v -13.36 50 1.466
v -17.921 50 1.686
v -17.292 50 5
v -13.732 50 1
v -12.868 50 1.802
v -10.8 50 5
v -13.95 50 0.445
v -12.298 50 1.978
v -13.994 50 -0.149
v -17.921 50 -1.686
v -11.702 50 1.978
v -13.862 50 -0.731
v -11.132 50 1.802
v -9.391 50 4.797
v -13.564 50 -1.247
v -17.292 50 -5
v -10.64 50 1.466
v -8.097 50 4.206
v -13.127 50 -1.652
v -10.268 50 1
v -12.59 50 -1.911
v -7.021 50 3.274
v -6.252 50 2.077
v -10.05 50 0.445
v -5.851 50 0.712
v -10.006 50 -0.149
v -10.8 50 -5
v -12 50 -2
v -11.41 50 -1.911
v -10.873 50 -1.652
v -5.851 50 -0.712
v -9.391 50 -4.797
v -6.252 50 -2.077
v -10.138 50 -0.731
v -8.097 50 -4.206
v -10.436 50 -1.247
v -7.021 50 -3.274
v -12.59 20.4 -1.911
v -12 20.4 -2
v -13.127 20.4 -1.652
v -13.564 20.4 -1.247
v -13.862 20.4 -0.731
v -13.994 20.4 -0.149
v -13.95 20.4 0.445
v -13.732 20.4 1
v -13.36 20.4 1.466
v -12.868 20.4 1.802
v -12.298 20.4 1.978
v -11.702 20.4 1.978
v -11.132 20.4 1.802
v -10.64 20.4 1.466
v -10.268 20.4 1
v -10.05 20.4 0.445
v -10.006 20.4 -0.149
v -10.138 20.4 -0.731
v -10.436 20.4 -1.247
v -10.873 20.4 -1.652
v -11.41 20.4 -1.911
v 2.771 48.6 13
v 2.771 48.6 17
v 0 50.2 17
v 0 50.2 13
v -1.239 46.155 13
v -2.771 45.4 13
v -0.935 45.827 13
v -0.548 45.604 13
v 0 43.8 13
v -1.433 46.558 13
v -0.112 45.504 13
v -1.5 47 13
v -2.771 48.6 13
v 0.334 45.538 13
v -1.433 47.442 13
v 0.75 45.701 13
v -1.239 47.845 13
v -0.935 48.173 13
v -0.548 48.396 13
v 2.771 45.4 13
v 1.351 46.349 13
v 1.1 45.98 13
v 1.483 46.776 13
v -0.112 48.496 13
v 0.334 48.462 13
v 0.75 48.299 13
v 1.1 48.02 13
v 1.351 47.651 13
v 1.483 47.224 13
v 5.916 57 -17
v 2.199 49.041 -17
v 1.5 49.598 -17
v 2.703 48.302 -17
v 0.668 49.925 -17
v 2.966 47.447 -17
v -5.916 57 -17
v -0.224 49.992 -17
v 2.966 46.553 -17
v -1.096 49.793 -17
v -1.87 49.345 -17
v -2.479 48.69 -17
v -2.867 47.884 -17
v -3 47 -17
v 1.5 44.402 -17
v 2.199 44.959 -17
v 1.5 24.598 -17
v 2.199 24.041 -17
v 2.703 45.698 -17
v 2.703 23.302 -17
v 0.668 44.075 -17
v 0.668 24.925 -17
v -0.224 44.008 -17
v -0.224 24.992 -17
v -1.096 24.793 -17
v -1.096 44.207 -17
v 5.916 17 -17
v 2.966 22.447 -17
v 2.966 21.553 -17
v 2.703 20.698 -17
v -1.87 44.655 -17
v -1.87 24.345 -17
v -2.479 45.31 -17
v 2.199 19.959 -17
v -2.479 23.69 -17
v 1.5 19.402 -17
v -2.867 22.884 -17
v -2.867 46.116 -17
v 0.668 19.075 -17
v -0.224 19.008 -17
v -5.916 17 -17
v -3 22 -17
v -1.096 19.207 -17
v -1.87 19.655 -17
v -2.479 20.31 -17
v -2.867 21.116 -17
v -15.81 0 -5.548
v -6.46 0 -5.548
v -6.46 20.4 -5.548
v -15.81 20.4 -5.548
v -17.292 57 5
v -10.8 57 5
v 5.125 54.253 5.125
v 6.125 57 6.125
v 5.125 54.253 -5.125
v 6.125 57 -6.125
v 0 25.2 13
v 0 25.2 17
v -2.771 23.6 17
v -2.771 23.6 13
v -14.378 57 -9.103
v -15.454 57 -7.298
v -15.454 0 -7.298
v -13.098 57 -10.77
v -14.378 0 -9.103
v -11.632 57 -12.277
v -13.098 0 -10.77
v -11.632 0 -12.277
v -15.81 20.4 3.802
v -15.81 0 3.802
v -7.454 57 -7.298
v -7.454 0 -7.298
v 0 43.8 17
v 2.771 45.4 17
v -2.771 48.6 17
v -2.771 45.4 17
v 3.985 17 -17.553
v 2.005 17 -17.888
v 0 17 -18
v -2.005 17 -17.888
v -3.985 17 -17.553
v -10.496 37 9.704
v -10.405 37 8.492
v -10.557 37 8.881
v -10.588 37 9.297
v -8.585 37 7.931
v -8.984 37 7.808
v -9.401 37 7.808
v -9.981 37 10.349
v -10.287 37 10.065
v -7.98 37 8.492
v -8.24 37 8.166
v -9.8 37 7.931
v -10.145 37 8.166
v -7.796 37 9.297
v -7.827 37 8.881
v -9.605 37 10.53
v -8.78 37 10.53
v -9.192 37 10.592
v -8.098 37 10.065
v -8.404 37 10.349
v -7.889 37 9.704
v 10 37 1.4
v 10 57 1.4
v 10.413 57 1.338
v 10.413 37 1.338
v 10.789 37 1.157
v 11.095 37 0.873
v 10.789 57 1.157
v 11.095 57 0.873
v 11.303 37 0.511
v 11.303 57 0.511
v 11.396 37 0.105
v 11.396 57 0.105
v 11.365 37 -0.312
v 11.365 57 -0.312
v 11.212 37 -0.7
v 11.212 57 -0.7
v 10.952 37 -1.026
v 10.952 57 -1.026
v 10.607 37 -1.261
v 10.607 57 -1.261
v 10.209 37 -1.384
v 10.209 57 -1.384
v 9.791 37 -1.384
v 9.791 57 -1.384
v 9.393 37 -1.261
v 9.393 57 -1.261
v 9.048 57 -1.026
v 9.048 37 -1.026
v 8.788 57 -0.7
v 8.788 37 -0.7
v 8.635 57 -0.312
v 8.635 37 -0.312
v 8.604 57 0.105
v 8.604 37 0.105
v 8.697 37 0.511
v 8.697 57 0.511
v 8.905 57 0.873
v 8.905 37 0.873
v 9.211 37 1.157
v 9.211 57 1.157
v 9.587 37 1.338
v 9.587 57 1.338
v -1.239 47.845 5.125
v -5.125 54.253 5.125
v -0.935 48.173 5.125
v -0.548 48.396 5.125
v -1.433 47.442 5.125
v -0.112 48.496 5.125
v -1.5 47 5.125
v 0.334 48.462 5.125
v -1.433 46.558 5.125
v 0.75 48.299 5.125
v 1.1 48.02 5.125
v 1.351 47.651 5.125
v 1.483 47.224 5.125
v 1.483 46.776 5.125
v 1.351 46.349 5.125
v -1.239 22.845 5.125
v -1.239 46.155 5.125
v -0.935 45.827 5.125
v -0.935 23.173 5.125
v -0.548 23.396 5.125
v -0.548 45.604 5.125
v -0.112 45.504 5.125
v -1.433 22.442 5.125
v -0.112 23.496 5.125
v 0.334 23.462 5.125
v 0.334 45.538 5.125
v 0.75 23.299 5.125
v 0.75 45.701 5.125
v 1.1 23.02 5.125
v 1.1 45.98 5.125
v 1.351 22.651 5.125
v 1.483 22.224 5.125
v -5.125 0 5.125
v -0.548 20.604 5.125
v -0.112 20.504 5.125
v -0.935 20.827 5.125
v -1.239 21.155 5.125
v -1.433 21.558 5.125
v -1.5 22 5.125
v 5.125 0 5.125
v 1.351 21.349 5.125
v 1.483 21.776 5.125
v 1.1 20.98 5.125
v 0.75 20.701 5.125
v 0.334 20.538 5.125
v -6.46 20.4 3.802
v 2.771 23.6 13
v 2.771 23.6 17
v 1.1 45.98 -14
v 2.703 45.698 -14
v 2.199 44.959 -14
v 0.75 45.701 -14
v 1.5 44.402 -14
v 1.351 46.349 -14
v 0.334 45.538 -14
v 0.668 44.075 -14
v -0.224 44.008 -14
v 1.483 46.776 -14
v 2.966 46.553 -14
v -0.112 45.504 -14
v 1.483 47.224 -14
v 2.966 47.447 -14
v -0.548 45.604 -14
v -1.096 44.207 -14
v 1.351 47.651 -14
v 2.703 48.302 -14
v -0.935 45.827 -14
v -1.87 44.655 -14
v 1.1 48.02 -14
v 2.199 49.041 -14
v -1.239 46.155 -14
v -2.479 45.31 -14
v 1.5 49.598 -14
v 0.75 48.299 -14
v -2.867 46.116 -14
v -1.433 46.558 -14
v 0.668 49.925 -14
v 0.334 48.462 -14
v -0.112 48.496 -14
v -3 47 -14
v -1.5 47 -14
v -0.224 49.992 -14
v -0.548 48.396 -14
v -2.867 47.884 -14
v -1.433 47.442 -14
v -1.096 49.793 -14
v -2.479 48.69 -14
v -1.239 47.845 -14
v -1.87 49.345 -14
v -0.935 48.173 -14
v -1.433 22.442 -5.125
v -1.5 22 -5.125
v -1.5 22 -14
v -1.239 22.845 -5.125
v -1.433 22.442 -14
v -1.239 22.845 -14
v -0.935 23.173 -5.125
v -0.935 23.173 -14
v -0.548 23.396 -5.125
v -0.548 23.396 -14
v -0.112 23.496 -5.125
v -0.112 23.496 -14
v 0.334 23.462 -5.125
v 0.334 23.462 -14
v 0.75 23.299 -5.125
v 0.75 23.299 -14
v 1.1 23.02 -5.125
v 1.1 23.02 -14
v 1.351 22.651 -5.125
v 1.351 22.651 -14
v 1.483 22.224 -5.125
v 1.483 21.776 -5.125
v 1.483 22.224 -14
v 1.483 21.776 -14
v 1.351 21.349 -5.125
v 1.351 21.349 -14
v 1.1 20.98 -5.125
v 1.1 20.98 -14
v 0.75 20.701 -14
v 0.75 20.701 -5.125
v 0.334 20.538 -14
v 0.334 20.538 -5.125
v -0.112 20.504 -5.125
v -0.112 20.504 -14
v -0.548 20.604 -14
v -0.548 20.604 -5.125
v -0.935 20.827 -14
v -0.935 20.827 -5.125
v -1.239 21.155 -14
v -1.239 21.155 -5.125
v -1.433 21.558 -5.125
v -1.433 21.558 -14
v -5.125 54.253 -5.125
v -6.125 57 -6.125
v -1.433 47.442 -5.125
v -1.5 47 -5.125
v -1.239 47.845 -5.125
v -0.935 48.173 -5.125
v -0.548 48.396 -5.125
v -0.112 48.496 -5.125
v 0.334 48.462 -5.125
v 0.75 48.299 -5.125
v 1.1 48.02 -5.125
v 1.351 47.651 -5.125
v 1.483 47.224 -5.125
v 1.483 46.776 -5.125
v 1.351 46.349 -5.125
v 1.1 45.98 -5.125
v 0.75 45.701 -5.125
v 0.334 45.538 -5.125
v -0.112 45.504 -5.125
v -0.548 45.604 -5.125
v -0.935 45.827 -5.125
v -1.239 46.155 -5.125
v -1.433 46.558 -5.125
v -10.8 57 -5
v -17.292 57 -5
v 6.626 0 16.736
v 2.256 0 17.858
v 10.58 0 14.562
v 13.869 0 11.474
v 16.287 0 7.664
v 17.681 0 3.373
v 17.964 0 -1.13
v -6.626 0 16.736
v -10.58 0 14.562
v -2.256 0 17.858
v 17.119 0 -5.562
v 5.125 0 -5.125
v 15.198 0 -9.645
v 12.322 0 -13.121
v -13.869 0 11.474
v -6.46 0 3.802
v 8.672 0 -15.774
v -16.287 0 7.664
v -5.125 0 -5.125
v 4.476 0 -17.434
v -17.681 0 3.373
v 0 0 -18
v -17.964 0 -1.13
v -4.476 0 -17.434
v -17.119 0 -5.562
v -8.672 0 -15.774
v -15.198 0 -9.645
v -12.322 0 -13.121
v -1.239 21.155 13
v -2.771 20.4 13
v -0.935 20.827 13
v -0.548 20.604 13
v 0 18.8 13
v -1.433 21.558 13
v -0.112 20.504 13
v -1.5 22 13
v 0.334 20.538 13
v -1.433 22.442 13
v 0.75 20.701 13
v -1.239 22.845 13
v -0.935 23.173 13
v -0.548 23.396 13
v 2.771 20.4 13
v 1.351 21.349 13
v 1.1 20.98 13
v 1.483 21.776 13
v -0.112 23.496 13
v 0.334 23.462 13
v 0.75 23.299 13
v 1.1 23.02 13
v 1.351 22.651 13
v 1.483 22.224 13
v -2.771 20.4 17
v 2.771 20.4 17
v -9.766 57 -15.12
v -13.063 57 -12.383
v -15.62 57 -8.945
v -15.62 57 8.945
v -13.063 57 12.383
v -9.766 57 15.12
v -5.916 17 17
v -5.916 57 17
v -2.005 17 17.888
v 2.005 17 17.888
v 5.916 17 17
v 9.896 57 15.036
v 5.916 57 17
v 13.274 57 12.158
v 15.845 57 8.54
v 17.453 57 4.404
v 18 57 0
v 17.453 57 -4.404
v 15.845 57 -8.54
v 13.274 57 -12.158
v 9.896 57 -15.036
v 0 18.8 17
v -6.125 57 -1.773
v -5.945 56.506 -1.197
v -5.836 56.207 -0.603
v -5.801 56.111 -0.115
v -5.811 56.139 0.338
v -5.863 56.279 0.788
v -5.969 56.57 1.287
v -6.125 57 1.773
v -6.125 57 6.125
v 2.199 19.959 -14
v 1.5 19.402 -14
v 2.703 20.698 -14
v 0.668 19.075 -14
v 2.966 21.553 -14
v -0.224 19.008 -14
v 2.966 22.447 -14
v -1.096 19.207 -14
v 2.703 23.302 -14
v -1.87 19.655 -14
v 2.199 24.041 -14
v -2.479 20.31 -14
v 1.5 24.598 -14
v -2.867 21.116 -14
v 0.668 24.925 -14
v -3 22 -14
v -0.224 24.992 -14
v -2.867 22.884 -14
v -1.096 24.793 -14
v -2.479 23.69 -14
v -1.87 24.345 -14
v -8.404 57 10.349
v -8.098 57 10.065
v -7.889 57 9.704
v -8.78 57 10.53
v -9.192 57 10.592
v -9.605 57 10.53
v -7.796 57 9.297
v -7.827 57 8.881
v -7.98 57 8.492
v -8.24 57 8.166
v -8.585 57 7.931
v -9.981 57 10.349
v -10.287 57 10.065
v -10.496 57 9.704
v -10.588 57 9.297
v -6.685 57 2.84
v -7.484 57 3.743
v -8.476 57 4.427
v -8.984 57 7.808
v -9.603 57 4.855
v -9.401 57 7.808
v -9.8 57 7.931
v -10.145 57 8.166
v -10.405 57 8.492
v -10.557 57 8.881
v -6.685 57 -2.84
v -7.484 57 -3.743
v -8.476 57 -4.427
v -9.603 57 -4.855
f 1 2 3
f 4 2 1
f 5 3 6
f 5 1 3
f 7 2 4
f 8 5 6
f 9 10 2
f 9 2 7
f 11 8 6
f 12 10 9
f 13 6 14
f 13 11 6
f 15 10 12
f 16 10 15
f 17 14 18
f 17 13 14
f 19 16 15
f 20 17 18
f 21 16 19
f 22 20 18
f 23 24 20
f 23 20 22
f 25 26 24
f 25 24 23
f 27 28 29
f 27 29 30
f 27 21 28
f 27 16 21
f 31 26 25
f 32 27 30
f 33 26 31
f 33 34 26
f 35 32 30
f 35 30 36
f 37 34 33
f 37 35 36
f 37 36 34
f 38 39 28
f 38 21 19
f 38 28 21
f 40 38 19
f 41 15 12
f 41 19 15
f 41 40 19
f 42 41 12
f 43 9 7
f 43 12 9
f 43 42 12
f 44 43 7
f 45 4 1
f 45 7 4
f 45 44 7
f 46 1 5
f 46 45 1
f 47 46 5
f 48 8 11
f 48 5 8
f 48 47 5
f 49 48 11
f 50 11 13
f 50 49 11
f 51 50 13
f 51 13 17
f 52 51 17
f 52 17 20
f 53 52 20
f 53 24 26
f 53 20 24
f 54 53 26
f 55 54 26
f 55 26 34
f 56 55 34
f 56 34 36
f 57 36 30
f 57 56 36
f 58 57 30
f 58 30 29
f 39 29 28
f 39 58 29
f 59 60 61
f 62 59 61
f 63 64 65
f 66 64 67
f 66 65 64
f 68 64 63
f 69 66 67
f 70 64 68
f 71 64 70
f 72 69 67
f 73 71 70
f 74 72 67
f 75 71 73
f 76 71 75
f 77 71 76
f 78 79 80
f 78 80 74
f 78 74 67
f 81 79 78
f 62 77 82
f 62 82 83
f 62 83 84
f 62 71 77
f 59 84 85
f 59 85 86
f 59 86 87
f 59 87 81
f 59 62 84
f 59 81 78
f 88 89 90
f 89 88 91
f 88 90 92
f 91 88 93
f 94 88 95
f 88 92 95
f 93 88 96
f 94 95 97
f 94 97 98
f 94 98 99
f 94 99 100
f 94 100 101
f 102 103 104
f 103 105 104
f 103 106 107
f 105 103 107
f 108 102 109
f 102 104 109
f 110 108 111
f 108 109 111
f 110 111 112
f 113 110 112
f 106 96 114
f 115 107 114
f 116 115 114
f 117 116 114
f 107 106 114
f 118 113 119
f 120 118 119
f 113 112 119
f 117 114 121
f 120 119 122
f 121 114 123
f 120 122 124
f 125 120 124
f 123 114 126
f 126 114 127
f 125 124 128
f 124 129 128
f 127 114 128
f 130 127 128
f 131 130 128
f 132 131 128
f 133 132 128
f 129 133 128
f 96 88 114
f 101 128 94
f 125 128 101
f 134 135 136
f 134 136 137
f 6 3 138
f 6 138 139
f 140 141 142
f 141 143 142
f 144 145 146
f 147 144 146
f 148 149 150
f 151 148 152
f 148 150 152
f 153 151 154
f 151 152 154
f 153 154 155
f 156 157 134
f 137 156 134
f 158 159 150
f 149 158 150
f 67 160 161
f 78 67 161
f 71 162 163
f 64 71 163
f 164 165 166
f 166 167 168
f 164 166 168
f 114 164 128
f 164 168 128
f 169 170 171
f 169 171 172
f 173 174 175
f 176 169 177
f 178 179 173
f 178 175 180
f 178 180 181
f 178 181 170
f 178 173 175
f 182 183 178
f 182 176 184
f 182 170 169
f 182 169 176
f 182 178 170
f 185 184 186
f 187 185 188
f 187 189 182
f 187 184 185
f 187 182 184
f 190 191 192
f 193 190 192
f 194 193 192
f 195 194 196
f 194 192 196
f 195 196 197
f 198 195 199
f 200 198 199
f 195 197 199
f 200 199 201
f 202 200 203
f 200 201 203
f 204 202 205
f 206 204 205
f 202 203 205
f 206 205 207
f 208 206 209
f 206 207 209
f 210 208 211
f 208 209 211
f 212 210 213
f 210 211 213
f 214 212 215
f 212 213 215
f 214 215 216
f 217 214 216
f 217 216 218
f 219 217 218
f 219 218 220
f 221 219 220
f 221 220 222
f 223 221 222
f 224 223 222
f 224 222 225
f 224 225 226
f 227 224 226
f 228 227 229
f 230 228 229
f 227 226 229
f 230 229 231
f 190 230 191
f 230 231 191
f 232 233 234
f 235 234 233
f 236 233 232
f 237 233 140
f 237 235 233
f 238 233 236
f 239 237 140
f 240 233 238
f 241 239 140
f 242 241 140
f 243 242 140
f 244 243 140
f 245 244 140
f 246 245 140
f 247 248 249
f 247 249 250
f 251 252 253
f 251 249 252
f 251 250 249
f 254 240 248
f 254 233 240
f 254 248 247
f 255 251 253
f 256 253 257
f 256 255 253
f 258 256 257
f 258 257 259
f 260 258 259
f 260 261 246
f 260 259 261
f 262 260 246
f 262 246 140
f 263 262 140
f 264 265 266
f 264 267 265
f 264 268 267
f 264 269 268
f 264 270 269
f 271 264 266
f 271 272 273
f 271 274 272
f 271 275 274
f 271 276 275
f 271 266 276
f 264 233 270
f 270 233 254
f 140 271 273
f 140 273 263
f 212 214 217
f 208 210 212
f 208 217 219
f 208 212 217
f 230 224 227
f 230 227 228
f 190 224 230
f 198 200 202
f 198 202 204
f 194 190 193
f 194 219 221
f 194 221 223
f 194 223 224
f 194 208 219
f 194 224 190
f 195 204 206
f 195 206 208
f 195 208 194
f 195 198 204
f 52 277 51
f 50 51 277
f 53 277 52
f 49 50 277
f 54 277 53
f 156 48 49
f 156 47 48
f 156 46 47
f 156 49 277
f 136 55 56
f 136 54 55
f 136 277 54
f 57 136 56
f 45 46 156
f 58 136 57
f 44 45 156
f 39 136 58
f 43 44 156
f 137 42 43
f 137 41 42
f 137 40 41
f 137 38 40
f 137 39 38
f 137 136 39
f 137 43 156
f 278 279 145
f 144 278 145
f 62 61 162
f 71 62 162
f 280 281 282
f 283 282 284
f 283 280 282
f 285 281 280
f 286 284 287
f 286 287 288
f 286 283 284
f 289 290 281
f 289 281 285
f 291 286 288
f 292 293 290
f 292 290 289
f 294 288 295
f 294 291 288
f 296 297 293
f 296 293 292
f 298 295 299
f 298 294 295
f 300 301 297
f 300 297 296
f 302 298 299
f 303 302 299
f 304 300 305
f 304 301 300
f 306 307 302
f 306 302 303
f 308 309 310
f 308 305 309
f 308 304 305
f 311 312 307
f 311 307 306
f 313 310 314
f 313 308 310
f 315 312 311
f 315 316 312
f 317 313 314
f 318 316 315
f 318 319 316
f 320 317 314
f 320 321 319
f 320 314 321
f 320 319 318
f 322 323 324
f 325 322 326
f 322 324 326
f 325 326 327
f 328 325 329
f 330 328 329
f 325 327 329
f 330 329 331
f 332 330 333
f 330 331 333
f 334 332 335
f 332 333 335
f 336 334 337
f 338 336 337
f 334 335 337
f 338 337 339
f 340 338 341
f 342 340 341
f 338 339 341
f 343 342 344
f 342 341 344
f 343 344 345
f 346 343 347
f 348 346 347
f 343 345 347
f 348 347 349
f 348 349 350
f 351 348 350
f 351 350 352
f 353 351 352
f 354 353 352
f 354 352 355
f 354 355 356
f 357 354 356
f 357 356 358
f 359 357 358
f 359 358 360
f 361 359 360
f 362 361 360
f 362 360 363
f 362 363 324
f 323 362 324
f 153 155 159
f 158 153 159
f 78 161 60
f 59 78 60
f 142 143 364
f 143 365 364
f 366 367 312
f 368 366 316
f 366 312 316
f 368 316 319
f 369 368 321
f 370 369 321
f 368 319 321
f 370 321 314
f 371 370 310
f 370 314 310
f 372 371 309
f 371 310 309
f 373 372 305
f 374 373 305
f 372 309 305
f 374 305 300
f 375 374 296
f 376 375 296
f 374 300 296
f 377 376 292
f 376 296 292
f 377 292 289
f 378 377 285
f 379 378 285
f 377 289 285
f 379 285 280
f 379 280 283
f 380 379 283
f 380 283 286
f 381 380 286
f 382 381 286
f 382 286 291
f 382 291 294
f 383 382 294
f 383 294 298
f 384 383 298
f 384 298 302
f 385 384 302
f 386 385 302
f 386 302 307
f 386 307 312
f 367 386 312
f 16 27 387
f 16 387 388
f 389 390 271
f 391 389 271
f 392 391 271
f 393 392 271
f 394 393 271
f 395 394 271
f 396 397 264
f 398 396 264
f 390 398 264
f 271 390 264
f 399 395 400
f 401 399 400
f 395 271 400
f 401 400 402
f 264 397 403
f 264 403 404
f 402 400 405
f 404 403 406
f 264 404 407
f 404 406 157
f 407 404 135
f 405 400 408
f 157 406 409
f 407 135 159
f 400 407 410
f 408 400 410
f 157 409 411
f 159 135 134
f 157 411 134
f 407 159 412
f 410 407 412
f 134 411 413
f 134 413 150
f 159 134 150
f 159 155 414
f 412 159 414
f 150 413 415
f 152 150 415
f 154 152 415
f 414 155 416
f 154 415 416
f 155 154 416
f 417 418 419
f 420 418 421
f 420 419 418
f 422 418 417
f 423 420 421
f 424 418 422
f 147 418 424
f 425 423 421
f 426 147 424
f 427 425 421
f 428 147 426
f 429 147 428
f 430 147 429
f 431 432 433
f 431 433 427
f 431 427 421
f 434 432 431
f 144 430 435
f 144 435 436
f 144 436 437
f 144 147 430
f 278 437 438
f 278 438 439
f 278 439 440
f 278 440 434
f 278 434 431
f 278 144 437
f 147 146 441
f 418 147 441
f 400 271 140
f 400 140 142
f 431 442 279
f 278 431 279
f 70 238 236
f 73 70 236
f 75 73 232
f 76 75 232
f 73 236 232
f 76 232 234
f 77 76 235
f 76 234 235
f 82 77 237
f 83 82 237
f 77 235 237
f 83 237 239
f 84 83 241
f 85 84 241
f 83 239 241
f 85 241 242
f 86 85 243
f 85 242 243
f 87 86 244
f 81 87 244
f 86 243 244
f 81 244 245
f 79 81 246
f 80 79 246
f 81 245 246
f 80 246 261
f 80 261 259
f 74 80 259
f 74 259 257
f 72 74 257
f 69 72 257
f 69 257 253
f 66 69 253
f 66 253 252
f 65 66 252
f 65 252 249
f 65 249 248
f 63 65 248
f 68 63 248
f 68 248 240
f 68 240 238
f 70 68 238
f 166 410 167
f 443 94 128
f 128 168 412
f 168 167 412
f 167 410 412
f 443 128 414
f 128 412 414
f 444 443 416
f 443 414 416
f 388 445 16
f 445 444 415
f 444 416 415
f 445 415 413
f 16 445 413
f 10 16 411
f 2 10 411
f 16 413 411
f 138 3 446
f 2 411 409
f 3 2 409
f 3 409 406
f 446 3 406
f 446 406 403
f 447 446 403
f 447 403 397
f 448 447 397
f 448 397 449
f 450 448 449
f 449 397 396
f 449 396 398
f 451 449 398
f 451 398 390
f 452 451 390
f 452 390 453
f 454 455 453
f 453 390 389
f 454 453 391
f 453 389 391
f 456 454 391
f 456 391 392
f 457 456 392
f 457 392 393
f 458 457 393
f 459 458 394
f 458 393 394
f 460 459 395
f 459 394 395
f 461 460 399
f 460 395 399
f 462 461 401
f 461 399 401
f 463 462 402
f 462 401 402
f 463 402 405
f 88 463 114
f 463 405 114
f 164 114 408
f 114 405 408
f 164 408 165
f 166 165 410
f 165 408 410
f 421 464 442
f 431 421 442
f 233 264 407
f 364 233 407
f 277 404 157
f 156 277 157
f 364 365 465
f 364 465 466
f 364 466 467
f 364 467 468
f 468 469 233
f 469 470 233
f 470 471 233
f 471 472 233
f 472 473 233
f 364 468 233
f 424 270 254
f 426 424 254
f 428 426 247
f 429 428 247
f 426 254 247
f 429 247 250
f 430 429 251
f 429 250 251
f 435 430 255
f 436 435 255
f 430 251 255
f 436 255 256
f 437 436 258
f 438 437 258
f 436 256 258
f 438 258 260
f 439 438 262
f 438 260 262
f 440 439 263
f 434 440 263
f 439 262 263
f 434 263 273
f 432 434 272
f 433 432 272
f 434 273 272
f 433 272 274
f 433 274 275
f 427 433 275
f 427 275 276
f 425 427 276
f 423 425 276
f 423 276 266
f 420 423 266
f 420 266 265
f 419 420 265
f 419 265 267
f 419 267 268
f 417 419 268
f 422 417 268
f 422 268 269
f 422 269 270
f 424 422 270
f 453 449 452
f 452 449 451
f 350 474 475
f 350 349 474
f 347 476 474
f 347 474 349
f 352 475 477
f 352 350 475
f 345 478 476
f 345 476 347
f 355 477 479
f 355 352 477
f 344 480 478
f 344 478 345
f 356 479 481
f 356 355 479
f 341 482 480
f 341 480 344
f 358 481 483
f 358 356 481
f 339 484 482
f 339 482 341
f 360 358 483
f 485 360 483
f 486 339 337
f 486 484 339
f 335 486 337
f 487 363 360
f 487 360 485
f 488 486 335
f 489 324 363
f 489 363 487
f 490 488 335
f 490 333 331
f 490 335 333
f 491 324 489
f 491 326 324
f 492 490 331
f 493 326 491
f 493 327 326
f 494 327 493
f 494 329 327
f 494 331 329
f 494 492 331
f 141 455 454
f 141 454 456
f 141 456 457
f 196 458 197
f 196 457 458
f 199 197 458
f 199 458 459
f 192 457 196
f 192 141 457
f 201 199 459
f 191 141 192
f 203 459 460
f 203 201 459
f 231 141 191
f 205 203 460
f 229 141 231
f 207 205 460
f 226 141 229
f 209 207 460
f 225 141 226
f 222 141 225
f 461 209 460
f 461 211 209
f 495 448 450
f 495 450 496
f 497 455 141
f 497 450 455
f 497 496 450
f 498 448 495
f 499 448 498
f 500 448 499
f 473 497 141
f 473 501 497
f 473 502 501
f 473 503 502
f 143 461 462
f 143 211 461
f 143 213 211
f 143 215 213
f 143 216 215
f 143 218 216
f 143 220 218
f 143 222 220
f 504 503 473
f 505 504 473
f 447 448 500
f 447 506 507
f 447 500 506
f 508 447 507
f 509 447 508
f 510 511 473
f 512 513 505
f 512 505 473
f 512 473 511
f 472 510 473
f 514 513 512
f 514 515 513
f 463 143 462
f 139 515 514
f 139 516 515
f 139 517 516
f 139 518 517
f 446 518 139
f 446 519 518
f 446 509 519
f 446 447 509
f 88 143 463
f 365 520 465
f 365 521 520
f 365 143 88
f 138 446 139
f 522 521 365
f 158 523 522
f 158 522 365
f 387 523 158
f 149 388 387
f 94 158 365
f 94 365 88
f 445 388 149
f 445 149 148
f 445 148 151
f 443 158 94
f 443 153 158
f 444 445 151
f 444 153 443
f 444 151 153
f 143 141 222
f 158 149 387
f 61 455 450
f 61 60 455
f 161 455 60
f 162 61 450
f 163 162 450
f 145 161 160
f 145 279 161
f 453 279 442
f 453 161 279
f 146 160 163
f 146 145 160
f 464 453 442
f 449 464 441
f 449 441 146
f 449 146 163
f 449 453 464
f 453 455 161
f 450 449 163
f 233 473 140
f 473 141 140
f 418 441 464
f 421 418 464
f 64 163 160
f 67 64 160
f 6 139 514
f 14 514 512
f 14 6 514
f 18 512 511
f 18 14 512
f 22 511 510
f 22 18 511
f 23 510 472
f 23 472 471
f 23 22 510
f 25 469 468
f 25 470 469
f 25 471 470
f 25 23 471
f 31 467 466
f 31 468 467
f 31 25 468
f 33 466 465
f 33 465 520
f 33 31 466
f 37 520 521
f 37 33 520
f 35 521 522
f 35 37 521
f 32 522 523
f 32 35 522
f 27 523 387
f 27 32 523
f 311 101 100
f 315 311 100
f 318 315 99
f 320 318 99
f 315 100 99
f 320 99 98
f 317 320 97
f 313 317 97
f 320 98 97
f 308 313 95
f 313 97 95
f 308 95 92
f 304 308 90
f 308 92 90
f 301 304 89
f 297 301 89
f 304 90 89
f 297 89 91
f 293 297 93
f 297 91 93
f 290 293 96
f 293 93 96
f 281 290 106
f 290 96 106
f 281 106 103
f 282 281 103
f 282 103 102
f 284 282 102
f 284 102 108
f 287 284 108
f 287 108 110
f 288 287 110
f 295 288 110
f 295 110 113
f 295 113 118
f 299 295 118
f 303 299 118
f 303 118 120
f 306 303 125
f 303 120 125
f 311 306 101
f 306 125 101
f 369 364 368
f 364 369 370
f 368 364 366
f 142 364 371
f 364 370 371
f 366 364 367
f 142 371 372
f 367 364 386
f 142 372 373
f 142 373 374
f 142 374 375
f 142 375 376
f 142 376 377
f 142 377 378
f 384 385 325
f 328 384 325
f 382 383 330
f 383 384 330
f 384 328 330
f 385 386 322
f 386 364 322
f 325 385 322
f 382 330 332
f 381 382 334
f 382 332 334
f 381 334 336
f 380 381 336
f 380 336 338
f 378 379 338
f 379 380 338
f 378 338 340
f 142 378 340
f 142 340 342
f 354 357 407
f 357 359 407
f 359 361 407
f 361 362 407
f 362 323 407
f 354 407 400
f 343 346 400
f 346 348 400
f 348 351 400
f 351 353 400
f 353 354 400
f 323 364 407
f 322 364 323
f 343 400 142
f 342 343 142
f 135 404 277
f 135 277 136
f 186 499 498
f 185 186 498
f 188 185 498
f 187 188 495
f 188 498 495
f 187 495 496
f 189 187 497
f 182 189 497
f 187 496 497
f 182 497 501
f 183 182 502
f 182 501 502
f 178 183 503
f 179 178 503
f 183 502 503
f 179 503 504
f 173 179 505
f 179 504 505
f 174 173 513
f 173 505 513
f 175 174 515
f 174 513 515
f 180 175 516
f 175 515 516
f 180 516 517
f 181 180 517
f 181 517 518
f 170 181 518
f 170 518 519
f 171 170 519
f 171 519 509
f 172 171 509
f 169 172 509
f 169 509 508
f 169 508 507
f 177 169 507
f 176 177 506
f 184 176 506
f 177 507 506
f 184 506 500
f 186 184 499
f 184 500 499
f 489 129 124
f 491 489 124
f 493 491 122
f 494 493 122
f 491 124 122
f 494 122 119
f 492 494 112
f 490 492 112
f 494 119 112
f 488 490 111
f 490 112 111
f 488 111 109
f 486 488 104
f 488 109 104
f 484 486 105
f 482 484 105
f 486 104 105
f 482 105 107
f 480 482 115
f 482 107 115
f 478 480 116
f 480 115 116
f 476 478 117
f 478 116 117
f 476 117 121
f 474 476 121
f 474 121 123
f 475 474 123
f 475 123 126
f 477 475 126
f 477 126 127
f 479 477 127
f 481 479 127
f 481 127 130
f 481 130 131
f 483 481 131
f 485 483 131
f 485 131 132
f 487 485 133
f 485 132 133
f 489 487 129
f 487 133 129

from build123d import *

# Parameters (mm, degrees)
SKETCH1_R           = 18
SKETCH1_R_2         = 2
SKETCH1_W           = 10.25
SKETCH1_H           = 10.25
BOSS_EXTRUDE1_DEPTH = 57
CUT_EXTRUDE1_START  = -7
CUT_EXTRUDE1_DEPTH  = 7
SKETCH4_W           = 9.35
SKETCH4_H           = 9.35
CUT_EXTRUDE3_DEPTH  = 20.4
CUT_EXTRUDE4_START  = -40
CUT_EXTRUDE4_DEPTH  = 40
SKETCH6_R           = 1.5
CUT_EXTRUDE5_DEPTH  = 70.267597042
SKETCH7_R           = 3
CUT_EXTRUDE6_DEPTH  = 3
CUT_EXTRUDE7_DEPTH  = 4
CHAMFER1_SIZE       = 1
CHAMFER1_SIZE_2     = 2.747477419
CUT_EXTRUDE8_DEPTH  = 63.42595614
SKETCH12_R          = 1.4
CUT_EXTRUDE10_DEPTH = 20


with BuildPart() as part:
    # Sketch1 → Boss-Extrude1 (new body)
    with BuildSketch(Plane(origin=(0, 0, 0), x_dir=(1, 0, 0), z_dir=(0, 1, 0))):
        with Locations(Location((0, 0, 0), (0, 0, 90))):
            Circle(SKETCH1_R)
        with Locations(Location((-12, 0, 0), (0, 0, 90))):
            Circle(SKETCH1_R_2, mode=Mode.SUBTRACT)
        Rectangle(SKETCH1_W, SKETCH1_H, mode=Mode.SUBTRACT)
    extrude(amount=BOSS_EXTRUDE1_DEPTH)

    # Sketch2 → Cut-Extrude1 (cut)
    with BuildSketch(Plane(origin=(0, 57, 0), x_dir=(1, 0, 0), z_dir=(0, 1, 0)).offset(CUT_EXTRUDE1_START)):
        with BuildLine():
            Line((-10.8, 5), (-17.291616466, 5))
            ThreePointArc((-17.291616466, 5), (-18, 0), (-17.291616466, -5))
            Line((-17.291616466, -5), (-10.8, -5))
            ThreePointArc((-10.8, -5), (-5.8, 0), (-10.8, 5))
        make_face()
    extrude(amount=CUT_EXTRUDE1_DEPTH, mode=Mode.SUBTRACT)

    # Sketch4 → Cut-Extrude3 (cut)
    with BuildSketch(Plane(origin=(0, 0, 0), x_dir=(-1, 0, 0), z_dir=(0, -1, 0))):
        with Locations((11.135393506, 0.872889968)):
            Rectangle(SKETCH4_W, SKETCH4_H)
    extrude(amount=-CUT_EXTRUDE3_DEPTH, mode=Mode.SUBTRACT)

    # Sketch5 → Cut-Extrude4 (cut)
    with BuildSketch(Plane(origin=(0, 57, 0), x_dir=(1, 0, 0), z_dir=(0, 1, 0)).offset(CUT_EXTRUDE4_START)):
        with BuildLine():
            Line((5.916079783, 17), (-5.916079783, 17))
            ThreePointArc((-5.916079783, 17), (0, 18), (5.916079783, 17))
        make_face()
        with BuildLine():
            Line((5.916079783, -17), (-5.916079783, -17))
            ThreePointArc((-5.916079783, -17), (0, -18), (5.916079783, -17))
        make_face()
    extrude(amount=CUT_EXTRUDE4_DEPTH, mode=Mode.SUBTRACT)

    # Sketch6 → Cut-Extrude5 (cut, through all)
    with BuildSketch(Plane(origin=(0, 0, -17), x_dir=(-1, 0, 0), z_dir=(0, 0, -1))):
        with Locations((0, 47)):
            Circle(SKETCH6_R)
        with Locations((0, 22)):
            Circle(SKETCH6_R)
    extrude(amount=-CUT_EXTRUDE5_DEPTH, mode=Mode.SUBTRACT)

    # Sketch7 → Cut-Extrude6 (cut)
    with BuildSketch(Plane(origin=(0, 0, -17), x_dir=(-1, 0, 0), z_dir=(0, 0, -1))):
        with Locations((0, 47)):
            Circle(SKETCH7_R)
        with Locations((0, 22)):
            Circle(SKETCH7_R)
    extrude(amount=-CUT_EXTRUDE6_DEPTH, mode=Mode.SUBTRACT)

    # Sketch8 → Cut-Extrude7 (cut)
    with BuildSketch(Plane.XY.offset(17)):
        Polygon((0, 43.8), (2.771281292, 45.4), (2.771281292, 48.6), (0, 50.2), (-2.771281292, 48.6), (-2.771281292, 45.4), align=None)
        Polygon((0, 18.8), (2.771281292, 20.4), (2.771281292, 23.6), (0, 25.2), (-2.771281292, 23.6), (-2.771281292, 20.4), align=None)
    extrude(amount=-CUT_EXTRUDE7_DEPTH, mode=Mode.SUBTRACT)

    # Chamfer1
    # the kernel refuses this chamfer: 2.747477419, 1 mm, written as the material it takes off along each edge
    with BuildSketch(Plane(origin=(-5.125, 57, -5.125), x_dir=(0, 0.09904090225204956, -0.9950833631817488), z_dir=(1, 0, 0)), Plane(origin=(-5.125, 57, 5.125), x_dir=(-0.9950833631817488, 0.09904090225204956, 0), z_dir=(0, 0, -1)), Plane(origin=(5.125, 57, 5.125), x_dir=(0, 0.09904090225204956, 0.9950833631817488), z_dir=(-1, 0, 0)), Plane(origin=(5.125, 57, -5.125), x_dir=(0.9950833631817488, 0.09904090225204956, 0), z_dir=(0, 0, 1))) as chamfer1_piece_1:
        Polygon((CHAMFER1_SIZE * 0.995083363182, -CHAMFER1_SIZE * 0.099040902252), (-CHAMFER1_SIZE_2 * 0.0990409022684, -CHAMFER1_SIZE_2 * 0.995083363346), (0, 0), align=None)
    extrude(amount=10.25, mode=Mode.SUBTRACT)
    with BuildSketch(Plane(origin=(-5.125, 57, 5.125), x_dir=(-0.9950833631817488, 0.09904090225204956, 0), z_dir=(0, 0, -1))) as chamfer1_piece_2a_section:
        Polygon((CHAMFER1_SIZE * 0.995083363182, -CHAMFER1_SIZE * 0.099040902252), (-CHAMFER1_SIZE_2 * 0.0990409022684, -CHAMFER1_SIZE_2 * 0.995083363346), (0, 0), align=None)
    chamfer1_piece_2a = extrude(amount=17.377491449, mode=Mode.PRIVATE)
    chamfer1_piece_2a = split(chamfer1_piece_2a, bisect_by=Plane(origin=(-5.432505006, 56.059901151, -5.125), z_dir=(0, 0, -1)), keep=Keep.TOP, mode=Mode.PRIVATE)
    with BuildSketch(Plane(origin=(-12.252491449, 57, -5.125), x_dir=(0, 0.09904090225204956, -0.9950833631817488), z_dir=(1, 0, 0))) as chamfer1_piece_2b_section:
        Polygon((CHAMFER1_SIZE * 0.995083363182, -CHAMFER1_SIZE * 0.099040902252), (-CHAMFER1_SIZE_2 * 0.0990409022684, -CHAMFER1_SIZE_2 * 0.995083363346), (0, 0), align=None)
    chamfer1_piece_2b = extrude(amount=17.377491449, mode=Mode.PRIVATE)
    chamfer1_piece_2b = split(chamfer1_piece_2b, bisect_by=Plane(origin=(-5.125, 56.059901151, -5.432505006), z_dir=(-1, 0, 0)), keep=Keep.TOP, mode=Mode.PRIVATE)
    chamfer1_piece_2 = chamfer1_piece_2a & chamfer1_piece_2b
    add(chamfer1_piece_2, mode=Mode.SUBTRACT)
    with BuildSketch(Plane(origin=(5.125, 57, -12.252491449), x_dir=(0.9950833631817488, 0.09904090225204956, 0), z_dir=(0, 0, 1))) as chamfer1_piece_3a_section:
        Polygon((CHAMFER1_SIZE * 0.995083363182, -CHAMFER1_SIZE * 0.099040902252), (-CHAMFER1_SIZE_2 * 0.0990409022684, -CHAMFER1_SIZE_2 * 0.995083363346), (0, 0), align=None)
    chamfer1_piece_3a = extrude(amount=17.377491449, mode=Mode.PRIVATE)
    chamfer1_piece_3a = split(chamfer1_piece_3a, bisect_by=Plane(origin=(5.432505006, 56.059901151, -5.125), z_dir=(0, 0, -1)), keep=Keep.TOP, mode=Mode.PRIVATE)
    with BuildSketch(Plane(origin=(-5.125, 57, -5.125), x_dir=(0, 0.09904090225204956, -0.9950833631817488), z_dir=(1, 0, 0))) as chamfer1_piece_3b_section:
        Polygon((CHAMFER1_SIZE * 0.995083363182, -CHAMFER1_SIZE * 0.099040902252), (-CHAMFER1_SIZE_2 * 0.0990409022684, -CHAMFER1_SIZE_2 * 0.995083363346), (0, 0), align=None)
    chamfer1_piece_3b = extrude(amount=17.377491449, mode=Mode.PRIVATE)
    chamfer1_piece_3b = split(chamfer1_piece_3b, bisect_by=Plane(origin=(5.125, 56.059901151, -5.432505006), z_dir=(1, 0, 0)), keep=Keep.TOP, mode=Mode.PRIVATE)
    chamfer1_piece_3 = chamfer1_piece_3a & chamfer1_piece_3b
    add(chamfer1_piece_3, mode=Mode.SUBTRACT)
    with BuildSketch(Plane(origin=(5.125, 57, 5.125), x_dir=(0, 0.09904090225204956, 0.9950833631817488), z_dir=(-1, 0, 0))) as chamfer1_piece_4a_section:
        Polygon((CHAMFER1_SIZE * 0.995083363182, -CHAMFER1_SIZE * 0.099040902252), (-CHAMFER1_SIZE_2 * 0.0990409022684, -CHAMFER1_SIZE_2 * 0.995083363346), (0, 0), align=None)
    chamfer1_piece_4a = extrude(amount=17.377491449, mode=Mode.PRIVATE)
    chamfer1_piece_4a = split(chamfer1_piece_4a, bisect_by=Plane(origin=(-5.125, 56.059901151, 5.432505006), z_dir=(-1, 0, 0)), keep=Keep.TOP, mode=Mode.PRIVATE)
    with BuildSketch(Plane(origin=(-5.125, 57, 12.252491449), x_dir=(-0.9950833631817488, 0.09904090225204956, 0), z_dir=(0, 0, -1))) as chamfer1_piece_4b_section:
        Polygon((CHAMFER1_SIZE * 0.995083363182, -CHAMFER1_SIZE * 0.099040902252), (-CHAMFER1_SIZE_2 * 0.0990409022684, -CHAMFER1_SIZE_2 * 0.995083363346), (0, 0), align=None)
    chamfer1_piece_4b = extrude(amount=17.377491449, mode=Mode.PRIVATE)
    chamfer1_piece_4b = split(chamfer1_piece_4b, bisect_by=Plane(origin=(-5.432505006, 56.059901151, 5.125), z_dir=(0, 0, 1)), keep=Keep.TOP, mode=Mode.PRIVATE)
    chamfer1_piece_4 = chamfer1_piece_4a & chamfer1_piece_4b
    add(chamfer1_piece_4, mode=Mode.SUBTRACT)
    with BuildSketch(Plane(origin=(12.252491449, 57, 5.125), x_dir=(0, 0.09904090225204956, 0.9950833631817488), z_dir=(-1, 0, 0))) as chamfer1_piece_5a_section:
        Polygon((CHAMFER1_SIZE * 0.995083363182, -CHAMFER1_SIZE * 0.099040902252), (-CHAMFER1_SIZE_2 * 0.0990409022684, -CHAMFER1_SIZE_2 * 0.995083363346), (0, 0), align=None)
    chamfer1_piece_5a = extrude(amount=17.377491449, mode=Mode.PRIVATE)
    chamfer1_piece_5a = split(chamfer1_piece_5a, bisect_by=Plane(origin=(5.125, 56.059901151, 5.432505006), z_dir=(1, 0, 0)), keep=Keep.TOP, mode=Mode.PRIVATE)
    with BuildSketch(Plane(origin=(5.125, 57, -5.125), x_dir=(0.9950833631817488, 0.09904090225204956, 0), z_dir=(0, 0, 1))) as chamfer1_piece_5b_section:
        Polygon((CHAMFER1_SIZE * 0.995083363182, -CHAMFER1_SIZE * 0.099040902252), (-CHAMFER1_SIZE_2 * 0.0990409022684, -CHAMFER1_SIZE_2 * 0.995083363346), (0, 0), align=None)
    chamfer1_piece_5b = extrude(amount=17.377491449, mode=Mode.PRIVATE)
    chamfer1_piece_5b = split(chamfer1_piece_5b, bisect_by=Plane(origin=(5.432505006, 56.059901151, 5.125), z_dir=(0, 0, 1)), keep=Keep.TOP, mode=Mode.PRIVATE)
    chamfer1_piece_5 = chamfer1_piece_5a & chamfer1_piece_5b
    add(chamfer1_piece_5, mode=Mode.SUBTRACT)

    # Sketch9 → Cut-Extrude8 (cut, through all)
    with BuildSketch(Plane.XZ):
        with BuildLine():
            Line((-7.454203172, -7.297889968), (-15.454203172, -7.297889968))
            ThreePointArc((-15.454203172, -7.297889968), (-13.761984914, -9.955415688), (-11.632322635, -12.277178848))
            Line((-11.632322635, -12.277178848), (-7.454203172, -7.297889968))
        make_face()
    extrude(amount=-CUT_EXTRUDE8_DEPTH, mode=Mode.SUBTRACT)

    # Sketch12 → Cut-Extrude10 (cut)
    with BuildSketch(Plane(origin=(0, 57, 0), x_dir=(1, 0, 0), z_dir=(0, 1, 0))):
        with Locations(Location((10, 0, 0), (0, 0, 270))):
            Circle(SKETCH12_R)
        with Locations(Location((-9.192388155, -9.192388155, 0), (0, 0, 270))):
            Circle(SKETCH12_R)
    extrude(amount=-CUT_EXTRUDE10_DEPTH, mode=Mode.SUBTRACT)


solid = part.part
